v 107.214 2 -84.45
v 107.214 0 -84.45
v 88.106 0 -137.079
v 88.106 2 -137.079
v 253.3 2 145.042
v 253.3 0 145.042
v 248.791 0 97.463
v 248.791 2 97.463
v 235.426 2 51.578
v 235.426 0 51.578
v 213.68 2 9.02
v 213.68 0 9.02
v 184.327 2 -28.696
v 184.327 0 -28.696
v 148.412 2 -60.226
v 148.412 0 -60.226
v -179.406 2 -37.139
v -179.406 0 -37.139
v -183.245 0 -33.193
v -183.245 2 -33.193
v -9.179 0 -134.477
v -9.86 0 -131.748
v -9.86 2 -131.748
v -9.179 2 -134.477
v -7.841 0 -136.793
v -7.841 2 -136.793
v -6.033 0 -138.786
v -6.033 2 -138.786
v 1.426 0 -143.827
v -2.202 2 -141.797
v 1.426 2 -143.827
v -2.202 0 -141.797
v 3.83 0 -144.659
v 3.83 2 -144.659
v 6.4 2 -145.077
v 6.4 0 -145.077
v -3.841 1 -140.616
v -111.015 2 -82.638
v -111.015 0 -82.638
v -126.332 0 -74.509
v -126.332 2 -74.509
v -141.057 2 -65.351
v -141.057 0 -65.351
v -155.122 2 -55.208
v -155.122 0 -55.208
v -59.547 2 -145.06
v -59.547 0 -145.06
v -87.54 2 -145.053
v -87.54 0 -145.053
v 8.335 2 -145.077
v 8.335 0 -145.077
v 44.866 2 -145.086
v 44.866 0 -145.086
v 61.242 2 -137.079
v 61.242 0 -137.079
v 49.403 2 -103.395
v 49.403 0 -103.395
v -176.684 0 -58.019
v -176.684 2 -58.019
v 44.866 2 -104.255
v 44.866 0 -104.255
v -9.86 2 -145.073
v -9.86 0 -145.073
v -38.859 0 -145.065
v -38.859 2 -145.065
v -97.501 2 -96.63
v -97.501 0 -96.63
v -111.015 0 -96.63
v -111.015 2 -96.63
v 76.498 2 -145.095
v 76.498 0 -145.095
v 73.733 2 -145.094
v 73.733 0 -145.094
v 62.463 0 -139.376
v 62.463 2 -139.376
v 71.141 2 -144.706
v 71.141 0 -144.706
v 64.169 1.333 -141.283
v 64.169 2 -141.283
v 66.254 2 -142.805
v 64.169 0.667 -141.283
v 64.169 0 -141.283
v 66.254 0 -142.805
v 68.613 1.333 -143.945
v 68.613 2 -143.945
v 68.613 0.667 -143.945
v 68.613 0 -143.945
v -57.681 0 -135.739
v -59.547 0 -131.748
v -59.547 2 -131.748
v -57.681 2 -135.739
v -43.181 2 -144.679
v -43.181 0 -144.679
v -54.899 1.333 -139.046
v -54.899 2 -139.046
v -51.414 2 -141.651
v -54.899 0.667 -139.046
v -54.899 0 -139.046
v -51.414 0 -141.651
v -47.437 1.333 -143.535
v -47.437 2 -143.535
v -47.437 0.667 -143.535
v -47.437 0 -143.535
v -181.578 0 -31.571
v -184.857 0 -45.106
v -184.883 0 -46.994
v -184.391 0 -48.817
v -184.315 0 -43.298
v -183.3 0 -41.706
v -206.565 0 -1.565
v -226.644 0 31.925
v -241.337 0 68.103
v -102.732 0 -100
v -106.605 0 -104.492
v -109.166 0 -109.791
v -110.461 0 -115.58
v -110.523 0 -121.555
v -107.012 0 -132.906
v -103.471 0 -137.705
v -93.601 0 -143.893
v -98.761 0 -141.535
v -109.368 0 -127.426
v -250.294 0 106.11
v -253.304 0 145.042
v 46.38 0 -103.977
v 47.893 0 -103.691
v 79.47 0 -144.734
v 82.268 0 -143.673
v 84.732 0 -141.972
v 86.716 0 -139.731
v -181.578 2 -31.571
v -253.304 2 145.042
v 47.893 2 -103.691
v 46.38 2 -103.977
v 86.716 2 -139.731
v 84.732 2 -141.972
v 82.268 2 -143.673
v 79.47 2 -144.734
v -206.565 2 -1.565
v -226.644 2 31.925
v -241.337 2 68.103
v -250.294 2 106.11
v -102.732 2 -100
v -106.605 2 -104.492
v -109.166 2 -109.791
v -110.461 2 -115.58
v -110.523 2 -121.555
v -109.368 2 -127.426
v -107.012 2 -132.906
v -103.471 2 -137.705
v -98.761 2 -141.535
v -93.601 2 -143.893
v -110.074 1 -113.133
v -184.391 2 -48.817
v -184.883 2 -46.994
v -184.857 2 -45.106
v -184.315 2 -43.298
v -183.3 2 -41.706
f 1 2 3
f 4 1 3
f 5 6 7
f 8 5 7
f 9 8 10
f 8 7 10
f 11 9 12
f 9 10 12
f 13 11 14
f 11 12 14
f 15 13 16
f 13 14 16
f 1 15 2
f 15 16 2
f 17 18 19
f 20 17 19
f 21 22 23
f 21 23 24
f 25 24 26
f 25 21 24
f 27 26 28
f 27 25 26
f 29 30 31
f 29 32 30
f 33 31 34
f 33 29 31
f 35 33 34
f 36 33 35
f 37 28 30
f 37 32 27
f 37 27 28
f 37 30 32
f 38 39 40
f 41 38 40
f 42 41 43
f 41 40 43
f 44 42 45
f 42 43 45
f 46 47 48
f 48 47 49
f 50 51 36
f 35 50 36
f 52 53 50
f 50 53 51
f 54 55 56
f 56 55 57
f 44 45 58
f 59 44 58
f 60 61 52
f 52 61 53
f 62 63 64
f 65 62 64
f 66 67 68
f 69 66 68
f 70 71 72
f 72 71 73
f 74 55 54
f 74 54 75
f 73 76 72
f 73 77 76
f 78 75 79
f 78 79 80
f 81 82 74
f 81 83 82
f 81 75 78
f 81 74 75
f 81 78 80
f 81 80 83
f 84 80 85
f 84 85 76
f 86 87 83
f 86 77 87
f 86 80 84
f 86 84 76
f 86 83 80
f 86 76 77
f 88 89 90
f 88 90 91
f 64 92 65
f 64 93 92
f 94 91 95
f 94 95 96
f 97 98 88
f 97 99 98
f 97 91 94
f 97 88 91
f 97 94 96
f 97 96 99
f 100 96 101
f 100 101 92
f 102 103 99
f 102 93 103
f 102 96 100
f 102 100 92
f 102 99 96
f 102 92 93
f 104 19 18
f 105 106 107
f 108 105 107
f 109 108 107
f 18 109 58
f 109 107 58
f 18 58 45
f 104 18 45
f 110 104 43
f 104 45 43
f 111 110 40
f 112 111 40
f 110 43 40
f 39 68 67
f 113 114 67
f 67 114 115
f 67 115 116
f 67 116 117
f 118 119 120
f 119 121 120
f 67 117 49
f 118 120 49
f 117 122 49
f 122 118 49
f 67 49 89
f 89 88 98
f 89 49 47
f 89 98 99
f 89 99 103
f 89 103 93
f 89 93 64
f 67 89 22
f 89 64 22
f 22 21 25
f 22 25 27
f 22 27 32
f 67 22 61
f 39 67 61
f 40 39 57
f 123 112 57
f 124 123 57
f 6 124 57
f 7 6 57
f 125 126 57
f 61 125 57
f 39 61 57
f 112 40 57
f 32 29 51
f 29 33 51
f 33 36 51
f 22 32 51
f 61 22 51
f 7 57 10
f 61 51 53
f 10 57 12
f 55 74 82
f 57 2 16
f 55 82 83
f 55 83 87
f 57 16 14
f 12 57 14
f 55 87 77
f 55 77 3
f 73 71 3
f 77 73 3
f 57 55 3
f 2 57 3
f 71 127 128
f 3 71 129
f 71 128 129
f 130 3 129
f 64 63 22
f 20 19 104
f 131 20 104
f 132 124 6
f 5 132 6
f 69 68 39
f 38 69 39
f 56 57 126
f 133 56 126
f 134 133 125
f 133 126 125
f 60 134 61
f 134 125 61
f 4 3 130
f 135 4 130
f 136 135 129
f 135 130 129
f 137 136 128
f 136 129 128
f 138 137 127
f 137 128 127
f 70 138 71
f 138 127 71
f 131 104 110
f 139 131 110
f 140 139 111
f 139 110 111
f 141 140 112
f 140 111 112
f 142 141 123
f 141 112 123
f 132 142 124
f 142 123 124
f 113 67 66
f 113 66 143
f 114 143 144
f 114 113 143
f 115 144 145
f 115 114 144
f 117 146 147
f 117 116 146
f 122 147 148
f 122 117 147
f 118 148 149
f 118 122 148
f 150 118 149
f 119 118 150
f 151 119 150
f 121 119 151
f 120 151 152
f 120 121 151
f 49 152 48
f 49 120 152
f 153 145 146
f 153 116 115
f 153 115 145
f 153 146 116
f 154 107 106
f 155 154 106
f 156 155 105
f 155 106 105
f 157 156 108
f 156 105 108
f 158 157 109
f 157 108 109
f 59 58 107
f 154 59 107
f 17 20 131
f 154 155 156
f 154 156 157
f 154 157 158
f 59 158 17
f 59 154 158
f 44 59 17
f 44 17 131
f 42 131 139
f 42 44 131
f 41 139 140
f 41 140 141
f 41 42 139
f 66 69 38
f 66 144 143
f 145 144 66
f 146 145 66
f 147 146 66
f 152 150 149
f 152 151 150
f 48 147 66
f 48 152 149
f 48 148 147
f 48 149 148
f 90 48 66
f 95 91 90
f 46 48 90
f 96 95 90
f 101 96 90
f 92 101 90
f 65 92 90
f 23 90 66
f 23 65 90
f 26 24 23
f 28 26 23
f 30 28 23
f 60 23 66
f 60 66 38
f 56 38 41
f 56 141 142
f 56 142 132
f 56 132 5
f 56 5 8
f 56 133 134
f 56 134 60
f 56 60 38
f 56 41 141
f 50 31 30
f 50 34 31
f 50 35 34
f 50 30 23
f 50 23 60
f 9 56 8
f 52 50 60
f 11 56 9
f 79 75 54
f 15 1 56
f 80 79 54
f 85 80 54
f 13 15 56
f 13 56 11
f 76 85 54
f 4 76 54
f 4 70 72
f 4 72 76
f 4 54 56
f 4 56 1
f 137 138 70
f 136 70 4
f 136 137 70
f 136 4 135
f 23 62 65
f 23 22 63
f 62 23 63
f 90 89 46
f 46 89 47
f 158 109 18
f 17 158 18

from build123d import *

# Parameters (mm, degrees)
AUFSATZ_LINEAR_AUSTRAGEN1_DEPTH = 2


with BuildPart() as part:
    # Skizze1 → Aufsatz-Linear austragen1 (new body)
    with BuildSketch(Plane(origin=(0, 0, 0), x_dir=(1, 0, 0), z_dir=(0, 1, 0))):
        with BuildLine():
            Line((-111.014713036, 96.629952772), (-111.014713036, 82.637944818))
            ThreePointArc((-111.014713036, 82.637944818), (-133.773093964, 70.056299779), (-155.121581381, 55.20760356))
            Line((-155.121581381, 55.20760356), (-176.68443544, 58.018627787))
            Line((-176.68443544, 58.018627787), (-184.391490567, 48.817347687))
            ThreePointArc((-184.391490567, 48.817347687), (-184.856553748, 45.106419523), (-183.300343728, 41.705613446))
            Line((-183.300343728, 41.705613446), (-179.406379638, 37.139090384))
            Line((-179.406379638, 37.139090384), (-183.244712688, 33.192915196))
            Line((-183.244712688, 33.192915196), (-181.577621487, 31.571382711))
            ThreePointArc((-181.577621487, 31.571382711), (-234.688503419, -49.730678526), (-253.304201651, -145.041993281))
            Line((-253.304201651, -145.041993281), (253.3, -145.041993281))
            ThreePointArc((253.3, -145.041993281), (213.679953091, -9.020178425), (107.2140887, 84.450148167))
            Line((107.2140887, 84.450148167), (88.10582283, 137.079482634))
            ThreePointArc((88.10582283, 137.079482634), (83.551519794, 142.896881485), (76.497849408, 145.094502845))
            Line((76.497849408, 145.094502845), (73.732714296, 145.093801448))
            add(Edge.make_bspline(
                [(61.241798353, 137.079482633), (63.12872124, 142.063691586), (68.556952847, 144.691016446), (73.732714296, 145.093801449)],
                knots=[0, 0, 0, 0, 0.846643391, 0.846643391, 0.846643391, 0.846643391], degree=3))
            Line((61.241798353, 137.079482633), (49.403316926, 103.395240199))
            ThreePointArc((49.403316926, 103.395240199), (47.136635501, 103.835273299), (44.866037129, 104.254626189))
            Line((44.866037129, 104.254626189), (44.866037129, 145.086479208))
            Line((44.866037129, 145.086479208), (8.335497246, 145.077212974))
            Line((8.335497246, 145.077212974), (6.400480376, 145.076722143))
            add(Edge.make_bspline(
                [(-9.859797389, 131.748243103), (-9.468785698, 135.744179636), (-3.989815347, 141.108587237), (2.485358217, 144.80702629), (6.400480376, 145.076722143)],
                knots=[0, 0, 0, 0, 0.454488203, 0.924546926, 0.924546926, 0.924546926, 0.924546926], degree=3))
            Line((-9.859797389, 131.748243103), (-9.859797389, 145.072597607))
            Line((-9.859797389, 145.072597607), (-38.85877651, 145.065241807))
            add(Edge.make_bspline(
                [(-59.546942015, 131.748243103), (-56.872959995, 140.401818923), (-47.428583468, 145.063068014), (-38.85877651, 145.065241807)],
                knots=[0, 0, 0, 0, 1, 1, 1, 1], degree=3))
            Line((-59.546942015, 131.748243103), (-59.546942015, 145.059994105))
            Line((-59.546942015, 145.059994105), (-87.539763433, 145.052893525))
            add(Edge.make_bspline(
                [(-97.500864535, 96.629952772), (-104.579533848, 99.859372788), (-116.831393377, 118.836705983), (-105.084694212, 143.726198357), (-87.539763433, 145.052893525)],
                knots=[0, 0, 0, 0, 0.332503248, 1, 1, 1, 1], degree=3))
            Line((-97.500864535, 96.629952772), (-111.014713036, 96.629952772))
        make_face()
    extrude(amount=AUFSATZ_LINEAR_AUSTRAGEN1_DEPTH)


solid = part.part
